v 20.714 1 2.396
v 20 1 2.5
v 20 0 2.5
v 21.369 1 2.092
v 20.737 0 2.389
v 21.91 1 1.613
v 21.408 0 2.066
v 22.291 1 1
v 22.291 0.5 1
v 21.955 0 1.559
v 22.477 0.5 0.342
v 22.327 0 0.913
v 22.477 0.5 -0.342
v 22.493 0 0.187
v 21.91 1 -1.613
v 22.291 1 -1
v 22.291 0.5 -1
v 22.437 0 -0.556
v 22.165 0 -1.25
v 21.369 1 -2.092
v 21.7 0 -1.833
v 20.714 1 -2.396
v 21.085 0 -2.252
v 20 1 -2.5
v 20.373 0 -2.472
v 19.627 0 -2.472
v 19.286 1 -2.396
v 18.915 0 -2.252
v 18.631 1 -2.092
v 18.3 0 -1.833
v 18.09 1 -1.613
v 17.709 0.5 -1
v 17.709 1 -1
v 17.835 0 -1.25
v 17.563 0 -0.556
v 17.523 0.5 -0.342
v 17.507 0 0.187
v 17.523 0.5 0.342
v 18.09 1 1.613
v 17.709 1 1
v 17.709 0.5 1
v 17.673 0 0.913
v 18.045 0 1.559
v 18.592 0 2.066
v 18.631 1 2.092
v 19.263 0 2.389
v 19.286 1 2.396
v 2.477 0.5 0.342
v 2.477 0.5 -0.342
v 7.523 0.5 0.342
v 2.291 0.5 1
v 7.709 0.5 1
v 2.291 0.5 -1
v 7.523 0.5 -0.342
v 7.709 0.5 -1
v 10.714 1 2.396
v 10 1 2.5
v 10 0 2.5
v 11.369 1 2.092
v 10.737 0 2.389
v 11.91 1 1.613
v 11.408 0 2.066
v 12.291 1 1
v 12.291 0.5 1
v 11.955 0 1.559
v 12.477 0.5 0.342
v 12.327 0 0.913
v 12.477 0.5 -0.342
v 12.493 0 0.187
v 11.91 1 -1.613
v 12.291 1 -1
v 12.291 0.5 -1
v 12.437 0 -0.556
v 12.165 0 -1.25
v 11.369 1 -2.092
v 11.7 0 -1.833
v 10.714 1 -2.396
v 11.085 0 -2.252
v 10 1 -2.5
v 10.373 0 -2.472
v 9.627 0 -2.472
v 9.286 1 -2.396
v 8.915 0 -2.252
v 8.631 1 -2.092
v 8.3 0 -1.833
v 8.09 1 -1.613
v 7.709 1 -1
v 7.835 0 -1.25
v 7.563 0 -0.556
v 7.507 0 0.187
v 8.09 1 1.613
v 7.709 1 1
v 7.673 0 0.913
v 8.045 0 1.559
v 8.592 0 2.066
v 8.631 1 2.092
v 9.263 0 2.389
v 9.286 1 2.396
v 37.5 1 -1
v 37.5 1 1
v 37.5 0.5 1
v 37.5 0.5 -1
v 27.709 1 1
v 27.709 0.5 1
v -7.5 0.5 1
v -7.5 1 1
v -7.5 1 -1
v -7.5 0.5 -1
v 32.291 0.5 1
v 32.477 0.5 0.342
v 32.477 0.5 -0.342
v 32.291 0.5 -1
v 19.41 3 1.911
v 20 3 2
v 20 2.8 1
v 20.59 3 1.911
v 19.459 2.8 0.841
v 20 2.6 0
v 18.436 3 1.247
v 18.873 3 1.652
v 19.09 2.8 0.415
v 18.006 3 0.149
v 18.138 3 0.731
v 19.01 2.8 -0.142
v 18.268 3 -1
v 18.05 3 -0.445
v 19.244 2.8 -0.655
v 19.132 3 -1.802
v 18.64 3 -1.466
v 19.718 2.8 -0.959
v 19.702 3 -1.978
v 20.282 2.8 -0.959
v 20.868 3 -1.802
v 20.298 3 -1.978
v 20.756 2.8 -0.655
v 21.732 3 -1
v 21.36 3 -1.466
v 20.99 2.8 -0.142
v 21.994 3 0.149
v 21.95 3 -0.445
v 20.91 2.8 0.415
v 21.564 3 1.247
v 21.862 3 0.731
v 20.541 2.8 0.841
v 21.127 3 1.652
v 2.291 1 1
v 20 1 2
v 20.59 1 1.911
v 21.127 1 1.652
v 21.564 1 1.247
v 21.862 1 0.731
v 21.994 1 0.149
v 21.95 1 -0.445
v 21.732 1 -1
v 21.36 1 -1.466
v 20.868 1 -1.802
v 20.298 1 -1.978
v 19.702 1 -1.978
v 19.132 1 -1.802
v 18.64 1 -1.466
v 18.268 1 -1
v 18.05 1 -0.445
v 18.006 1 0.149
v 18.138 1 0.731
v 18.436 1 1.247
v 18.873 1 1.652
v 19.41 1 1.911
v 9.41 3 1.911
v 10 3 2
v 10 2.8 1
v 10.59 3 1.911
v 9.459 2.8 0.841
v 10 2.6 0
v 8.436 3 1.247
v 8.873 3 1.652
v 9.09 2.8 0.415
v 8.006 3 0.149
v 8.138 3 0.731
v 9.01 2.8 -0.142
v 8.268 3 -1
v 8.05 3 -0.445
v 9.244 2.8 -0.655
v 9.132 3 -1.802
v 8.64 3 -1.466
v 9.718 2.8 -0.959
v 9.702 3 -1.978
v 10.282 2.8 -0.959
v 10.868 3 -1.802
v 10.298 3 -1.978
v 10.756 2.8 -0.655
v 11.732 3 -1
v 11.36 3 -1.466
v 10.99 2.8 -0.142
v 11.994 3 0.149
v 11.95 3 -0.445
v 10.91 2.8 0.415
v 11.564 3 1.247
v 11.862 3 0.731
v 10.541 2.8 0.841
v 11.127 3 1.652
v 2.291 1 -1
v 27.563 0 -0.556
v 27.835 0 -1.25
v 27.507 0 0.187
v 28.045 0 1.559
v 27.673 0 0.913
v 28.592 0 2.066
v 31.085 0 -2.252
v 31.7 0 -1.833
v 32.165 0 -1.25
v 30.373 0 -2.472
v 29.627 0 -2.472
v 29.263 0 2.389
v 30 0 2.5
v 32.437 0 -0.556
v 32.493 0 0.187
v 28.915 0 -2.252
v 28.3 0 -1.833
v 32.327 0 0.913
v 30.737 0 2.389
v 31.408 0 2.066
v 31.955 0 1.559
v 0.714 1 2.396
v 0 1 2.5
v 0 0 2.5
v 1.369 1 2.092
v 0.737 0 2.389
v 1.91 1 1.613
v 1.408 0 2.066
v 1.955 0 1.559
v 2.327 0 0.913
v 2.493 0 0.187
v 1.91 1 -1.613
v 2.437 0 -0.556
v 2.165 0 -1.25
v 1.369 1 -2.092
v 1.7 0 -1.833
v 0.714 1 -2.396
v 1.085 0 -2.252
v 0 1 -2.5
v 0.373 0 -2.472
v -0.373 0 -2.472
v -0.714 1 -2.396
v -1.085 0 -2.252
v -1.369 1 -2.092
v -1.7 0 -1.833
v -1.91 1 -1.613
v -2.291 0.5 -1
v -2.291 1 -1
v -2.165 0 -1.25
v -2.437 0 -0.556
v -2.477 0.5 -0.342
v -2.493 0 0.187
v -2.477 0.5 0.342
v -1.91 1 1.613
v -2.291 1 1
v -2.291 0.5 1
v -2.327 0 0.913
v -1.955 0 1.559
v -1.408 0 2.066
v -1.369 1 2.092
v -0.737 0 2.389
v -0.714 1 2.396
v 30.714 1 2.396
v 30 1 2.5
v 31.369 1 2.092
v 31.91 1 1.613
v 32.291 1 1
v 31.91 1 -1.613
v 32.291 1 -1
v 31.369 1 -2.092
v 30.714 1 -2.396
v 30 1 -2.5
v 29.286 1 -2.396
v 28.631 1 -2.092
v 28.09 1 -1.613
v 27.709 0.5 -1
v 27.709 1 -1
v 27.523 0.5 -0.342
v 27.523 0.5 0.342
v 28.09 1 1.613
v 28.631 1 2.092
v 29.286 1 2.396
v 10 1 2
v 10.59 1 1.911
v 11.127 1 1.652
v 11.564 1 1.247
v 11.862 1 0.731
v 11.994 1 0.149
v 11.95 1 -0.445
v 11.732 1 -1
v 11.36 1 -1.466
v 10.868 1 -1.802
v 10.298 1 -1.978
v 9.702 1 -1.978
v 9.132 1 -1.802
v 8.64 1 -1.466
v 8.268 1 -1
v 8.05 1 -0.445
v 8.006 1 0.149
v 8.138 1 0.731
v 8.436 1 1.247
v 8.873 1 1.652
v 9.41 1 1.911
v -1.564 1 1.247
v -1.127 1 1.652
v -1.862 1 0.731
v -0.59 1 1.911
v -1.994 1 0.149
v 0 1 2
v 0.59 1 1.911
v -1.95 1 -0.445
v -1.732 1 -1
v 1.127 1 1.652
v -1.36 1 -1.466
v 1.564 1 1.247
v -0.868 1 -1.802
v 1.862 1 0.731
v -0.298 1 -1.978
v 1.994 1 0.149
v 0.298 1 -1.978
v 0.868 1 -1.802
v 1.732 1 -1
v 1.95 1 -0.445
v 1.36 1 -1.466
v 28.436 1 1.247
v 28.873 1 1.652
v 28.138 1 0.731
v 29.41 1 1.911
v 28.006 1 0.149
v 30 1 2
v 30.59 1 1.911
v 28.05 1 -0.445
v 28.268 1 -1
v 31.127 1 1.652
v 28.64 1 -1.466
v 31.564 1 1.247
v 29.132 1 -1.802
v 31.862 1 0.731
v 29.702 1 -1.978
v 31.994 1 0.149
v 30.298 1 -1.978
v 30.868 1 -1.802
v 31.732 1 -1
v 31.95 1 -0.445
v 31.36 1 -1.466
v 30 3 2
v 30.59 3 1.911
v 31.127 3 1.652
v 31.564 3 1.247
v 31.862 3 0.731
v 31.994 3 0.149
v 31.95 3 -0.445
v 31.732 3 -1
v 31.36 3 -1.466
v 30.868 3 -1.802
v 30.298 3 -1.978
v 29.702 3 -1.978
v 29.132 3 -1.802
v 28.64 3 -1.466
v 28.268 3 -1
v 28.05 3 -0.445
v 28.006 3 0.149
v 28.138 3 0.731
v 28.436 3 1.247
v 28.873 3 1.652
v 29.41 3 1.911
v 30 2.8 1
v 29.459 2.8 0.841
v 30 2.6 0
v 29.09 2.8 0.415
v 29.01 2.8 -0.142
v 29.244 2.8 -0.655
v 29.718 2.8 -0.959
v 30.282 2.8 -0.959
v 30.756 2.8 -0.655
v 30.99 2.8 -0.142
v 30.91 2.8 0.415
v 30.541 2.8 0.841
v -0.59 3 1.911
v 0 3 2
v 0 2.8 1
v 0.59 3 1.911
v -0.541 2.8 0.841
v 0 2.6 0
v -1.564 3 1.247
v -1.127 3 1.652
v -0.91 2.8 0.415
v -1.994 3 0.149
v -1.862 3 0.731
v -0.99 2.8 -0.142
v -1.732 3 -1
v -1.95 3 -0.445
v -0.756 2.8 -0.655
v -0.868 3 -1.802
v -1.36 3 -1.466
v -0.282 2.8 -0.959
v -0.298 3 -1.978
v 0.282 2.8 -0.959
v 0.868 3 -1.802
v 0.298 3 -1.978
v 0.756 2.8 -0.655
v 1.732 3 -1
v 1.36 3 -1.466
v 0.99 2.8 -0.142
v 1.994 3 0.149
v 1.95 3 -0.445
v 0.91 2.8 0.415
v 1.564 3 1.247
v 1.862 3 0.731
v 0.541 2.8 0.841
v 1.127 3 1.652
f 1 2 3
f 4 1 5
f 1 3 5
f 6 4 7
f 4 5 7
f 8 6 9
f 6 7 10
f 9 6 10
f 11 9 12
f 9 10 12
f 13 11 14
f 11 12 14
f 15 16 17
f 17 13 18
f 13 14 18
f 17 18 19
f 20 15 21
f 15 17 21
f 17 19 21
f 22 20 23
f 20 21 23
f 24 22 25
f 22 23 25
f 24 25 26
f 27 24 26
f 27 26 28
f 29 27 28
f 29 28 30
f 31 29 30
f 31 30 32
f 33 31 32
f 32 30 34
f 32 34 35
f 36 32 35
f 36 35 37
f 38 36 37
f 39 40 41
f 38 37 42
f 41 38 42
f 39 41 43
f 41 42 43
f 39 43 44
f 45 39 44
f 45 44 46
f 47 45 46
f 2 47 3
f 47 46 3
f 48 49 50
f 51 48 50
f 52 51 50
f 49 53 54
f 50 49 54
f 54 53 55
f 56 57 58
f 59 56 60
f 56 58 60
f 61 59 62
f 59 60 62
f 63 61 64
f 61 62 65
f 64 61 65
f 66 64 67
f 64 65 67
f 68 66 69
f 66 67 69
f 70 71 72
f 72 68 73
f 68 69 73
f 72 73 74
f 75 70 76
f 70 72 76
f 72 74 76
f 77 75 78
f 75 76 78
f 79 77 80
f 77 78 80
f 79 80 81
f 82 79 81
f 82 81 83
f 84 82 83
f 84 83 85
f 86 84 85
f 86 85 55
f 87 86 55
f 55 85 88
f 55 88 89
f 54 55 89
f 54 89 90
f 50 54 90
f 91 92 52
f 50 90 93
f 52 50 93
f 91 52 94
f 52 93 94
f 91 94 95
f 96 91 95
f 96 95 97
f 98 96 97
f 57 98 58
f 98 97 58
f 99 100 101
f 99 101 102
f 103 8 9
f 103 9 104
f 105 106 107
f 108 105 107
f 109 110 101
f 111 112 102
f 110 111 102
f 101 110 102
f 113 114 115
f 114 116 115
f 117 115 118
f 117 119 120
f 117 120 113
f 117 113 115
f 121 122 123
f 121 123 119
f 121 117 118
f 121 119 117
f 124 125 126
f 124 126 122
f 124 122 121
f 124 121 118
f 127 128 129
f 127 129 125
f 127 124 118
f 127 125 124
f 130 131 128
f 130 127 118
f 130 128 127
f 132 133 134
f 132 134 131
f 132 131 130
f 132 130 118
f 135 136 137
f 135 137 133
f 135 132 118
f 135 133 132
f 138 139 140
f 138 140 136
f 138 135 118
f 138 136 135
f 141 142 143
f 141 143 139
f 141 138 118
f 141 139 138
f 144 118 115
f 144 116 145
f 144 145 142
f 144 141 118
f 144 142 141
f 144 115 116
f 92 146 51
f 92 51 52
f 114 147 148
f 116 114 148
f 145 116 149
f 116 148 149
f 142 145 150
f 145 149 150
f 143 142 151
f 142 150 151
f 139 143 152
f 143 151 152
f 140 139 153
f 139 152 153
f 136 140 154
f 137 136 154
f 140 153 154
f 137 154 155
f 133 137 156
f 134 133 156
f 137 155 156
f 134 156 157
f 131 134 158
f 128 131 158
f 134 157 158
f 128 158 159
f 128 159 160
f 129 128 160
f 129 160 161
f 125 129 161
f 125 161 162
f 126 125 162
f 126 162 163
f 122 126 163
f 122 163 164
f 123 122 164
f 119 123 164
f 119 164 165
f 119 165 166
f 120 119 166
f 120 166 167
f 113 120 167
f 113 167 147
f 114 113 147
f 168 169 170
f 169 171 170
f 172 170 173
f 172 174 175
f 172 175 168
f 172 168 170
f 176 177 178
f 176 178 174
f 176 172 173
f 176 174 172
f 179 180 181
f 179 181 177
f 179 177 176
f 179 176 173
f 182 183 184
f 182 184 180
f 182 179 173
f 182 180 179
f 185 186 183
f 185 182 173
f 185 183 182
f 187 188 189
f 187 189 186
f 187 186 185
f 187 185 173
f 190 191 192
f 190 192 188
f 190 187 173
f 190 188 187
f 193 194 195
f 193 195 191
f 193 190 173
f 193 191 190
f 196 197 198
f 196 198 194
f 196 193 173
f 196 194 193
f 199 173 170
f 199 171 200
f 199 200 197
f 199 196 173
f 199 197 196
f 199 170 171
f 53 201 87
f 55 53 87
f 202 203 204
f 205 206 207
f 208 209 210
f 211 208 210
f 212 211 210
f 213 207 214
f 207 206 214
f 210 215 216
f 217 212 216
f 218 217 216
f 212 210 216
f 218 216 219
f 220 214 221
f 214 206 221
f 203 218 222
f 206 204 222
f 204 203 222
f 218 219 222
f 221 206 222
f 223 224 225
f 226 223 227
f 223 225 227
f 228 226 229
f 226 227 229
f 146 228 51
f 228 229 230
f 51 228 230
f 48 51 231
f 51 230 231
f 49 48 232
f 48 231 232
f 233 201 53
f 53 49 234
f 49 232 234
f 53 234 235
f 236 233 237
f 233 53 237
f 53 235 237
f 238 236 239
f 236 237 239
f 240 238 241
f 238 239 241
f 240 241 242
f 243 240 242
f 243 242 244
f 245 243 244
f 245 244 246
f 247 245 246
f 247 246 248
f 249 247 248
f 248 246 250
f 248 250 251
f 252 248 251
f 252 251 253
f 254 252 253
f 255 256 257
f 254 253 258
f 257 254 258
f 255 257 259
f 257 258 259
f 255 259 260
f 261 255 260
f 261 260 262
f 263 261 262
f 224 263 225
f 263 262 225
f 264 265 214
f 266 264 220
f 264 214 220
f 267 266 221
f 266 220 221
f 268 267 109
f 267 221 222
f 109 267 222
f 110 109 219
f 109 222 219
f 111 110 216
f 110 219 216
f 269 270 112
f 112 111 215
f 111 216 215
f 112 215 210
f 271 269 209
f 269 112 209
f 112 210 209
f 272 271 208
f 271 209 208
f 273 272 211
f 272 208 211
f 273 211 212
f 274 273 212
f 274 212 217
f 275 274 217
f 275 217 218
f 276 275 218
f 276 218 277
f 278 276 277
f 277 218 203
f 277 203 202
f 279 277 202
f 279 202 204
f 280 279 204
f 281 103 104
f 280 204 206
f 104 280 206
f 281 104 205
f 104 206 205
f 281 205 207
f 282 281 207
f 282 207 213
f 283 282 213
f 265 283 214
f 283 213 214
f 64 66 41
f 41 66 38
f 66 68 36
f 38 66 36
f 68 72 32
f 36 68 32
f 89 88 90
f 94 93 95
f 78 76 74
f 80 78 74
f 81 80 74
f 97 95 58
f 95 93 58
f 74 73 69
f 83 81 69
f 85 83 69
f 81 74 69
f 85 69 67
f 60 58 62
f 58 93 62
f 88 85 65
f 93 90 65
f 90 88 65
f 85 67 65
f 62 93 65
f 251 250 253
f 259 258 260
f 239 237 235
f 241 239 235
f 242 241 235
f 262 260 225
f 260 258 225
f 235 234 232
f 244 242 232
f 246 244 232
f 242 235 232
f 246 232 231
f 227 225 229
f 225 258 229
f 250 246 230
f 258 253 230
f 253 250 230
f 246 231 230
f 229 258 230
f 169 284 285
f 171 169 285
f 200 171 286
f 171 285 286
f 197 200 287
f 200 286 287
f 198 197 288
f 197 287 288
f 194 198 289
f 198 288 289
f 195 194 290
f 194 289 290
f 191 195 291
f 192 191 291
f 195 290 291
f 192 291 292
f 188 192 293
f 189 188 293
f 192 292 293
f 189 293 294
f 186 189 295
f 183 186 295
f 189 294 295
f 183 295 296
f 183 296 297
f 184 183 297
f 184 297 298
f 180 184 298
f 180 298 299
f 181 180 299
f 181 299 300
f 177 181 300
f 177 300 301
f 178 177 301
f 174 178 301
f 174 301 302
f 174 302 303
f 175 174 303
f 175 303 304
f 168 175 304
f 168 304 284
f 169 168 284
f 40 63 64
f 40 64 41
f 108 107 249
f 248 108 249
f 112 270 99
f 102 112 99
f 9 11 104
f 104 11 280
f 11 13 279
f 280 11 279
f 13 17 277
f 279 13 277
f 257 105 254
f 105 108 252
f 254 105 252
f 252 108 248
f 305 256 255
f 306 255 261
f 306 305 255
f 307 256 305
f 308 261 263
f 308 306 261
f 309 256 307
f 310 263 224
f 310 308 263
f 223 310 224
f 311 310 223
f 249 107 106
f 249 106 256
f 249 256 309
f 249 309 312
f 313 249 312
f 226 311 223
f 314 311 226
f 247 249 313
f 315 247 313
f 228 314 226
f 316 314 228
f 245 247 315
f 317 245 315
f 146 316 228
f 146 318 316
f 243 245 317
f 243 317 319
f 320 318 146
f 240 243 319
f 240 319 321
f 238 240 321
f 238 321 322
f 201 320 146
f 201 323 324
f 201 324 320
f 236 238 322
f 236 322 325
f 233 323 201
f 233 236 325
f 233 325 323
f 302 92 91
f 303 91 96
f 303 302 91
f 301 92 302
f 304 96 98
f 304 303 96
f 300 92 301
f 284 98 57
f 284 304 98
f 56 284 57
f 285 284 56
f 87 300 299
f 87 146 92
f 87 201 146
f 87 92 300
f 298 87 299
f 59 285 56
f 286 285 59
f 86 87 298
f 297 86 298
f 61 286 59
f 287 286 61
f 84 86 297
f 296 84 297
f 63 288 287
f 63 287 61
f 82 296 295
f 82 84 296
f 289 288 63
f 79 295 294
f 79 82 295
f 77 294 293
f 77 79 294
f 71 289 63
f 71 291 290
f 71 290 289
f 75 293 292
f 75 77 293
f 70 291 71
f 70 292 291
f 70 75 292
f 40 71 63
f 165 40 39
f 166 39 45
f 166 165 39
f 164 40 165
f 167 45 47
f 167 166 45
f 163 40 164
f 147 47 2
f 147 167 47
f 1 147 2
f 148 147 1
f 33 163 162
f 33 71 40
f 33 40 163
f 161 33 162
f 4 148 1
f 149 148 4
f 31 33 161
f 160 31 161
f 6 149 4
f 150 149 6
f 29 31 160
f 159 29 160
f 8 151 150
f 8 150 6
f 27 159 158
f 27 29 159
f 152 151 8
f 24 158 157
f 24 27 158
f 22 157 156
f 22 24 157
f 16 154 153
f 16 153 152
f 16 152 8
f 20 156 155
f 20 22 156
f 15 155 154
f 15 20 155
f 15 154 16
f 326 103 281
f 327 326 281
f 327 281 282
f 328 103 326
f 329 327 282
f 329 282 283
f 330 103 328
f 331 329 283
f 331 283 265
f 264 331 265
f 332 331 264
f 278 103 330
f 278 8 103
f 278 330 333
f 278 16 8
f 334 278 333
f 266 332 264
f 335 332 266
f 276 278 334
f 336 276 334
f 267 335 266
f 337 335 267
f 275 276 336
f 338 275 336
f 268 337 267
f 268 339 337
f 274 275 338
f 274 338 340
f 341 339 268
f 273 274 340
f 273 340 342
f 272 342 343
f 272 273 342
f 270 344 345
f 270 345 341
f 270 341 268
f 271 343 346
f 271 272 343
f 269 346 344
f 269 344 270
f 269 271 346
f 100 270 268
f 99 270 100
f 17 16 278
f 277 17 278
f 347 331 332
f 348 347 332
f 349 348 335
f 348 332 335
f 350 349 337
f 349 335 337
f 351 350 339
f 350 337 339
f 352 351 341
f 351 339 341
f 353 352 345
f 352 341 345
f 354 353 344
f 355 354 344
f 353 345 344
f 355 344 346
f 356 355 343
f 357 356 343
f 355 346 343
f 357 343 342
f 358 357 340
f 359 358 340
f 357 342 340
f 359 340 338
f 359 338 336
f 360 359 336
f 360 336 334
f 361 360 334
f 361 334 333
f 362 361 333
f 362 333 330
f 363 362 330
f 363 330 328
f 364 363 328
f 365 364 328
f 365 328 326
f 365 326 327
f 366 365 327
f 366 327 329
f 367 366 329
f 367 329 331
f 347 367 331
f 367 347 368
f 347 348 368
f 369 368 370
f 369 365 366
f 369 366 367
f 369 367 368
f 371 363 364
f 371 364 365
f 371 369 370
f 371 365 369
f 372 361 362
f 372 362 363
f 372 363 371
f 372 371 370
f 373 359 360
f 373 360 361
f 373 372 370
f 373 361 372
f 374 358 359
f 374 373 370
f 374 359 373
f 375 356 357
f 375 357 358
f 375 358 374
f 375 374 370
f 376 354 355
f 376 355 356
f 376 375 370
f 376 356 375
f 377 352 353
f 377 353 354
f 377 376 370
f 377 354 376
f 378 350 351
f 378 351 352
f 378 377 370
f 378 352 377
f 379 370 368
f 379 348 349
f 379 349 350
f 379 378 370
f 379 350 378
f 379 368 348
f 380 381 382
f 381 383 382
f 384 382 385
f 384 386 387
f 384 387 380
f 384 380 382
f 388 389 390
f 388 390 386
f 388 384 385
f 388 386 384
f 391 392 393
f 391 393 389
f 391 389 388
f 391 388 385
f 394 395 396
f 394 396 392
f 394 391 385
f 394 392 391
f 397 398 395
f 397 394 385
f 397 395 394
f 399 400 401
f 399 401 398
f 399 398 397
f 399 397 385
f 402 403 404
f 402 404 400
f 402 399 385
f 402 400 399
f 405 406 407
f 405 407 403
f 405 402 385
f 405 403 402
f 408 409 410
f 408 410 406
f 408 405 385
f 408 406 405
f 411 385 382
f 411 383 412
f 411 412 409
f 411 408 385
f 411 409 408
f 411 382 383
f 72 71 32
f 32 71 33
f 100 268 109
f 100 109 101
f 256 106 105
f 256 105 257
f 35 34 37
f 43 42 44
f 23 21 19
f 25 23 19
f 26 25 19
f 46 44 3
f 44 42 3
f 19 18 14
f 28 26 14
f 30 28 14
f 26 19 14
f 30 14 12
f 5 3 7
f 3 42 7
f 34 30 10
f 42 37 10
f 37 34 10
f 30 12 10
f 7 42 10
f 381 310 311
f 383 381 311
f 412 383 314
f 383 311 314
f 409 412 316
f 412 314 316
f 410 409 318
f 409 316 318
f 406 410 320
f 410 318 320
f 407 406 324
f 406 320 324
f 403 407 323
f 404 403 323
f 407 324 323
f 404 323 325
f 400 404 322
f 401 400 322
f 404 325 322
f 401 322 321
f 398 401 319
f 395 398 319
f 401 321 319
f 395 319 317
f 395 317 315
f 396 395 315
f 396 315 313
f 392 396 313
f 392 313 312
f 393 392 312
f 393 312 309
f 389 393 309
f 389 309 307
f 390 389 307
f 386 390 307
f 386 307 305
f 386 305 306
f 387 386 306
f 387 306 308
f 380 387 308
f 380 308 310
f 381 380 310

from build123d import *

# Parameters (mm, degrees)
SKETCH1_R           = 2
BOSS_EXTRUDE1_DEPTH = 3
SKETCH3_R           = 2.5
BOSS_EXTRUDE3_DEPTH = 1
LPATTERN4_COUNT     = 4
LPATTERN4_PITCH     = 10
SKETCH4_W           = 45
SKETCH4_H           = 2
BOSS_EXTRUDE4_DEPTH = 0.5


with BuildPart() as part:
    # Sketch1 → Boss-Extrude1 (new body)
    with BuildSketch(Plane(origin=(0, 0, 0), x_dir=(1, 0, 0), z_dir=(0, 1, 0))):
        with Locations(Location((0, 0, 0), (0, 0, 270))):
            Circle(SKETCH1_R)
    extrude(amount=BOSS_EXTRUDE1_DEPTH)

    # Sketch2 → Cut-Revolve1 (revolve, cut)
    with BuildSketch(Plane(origin=(0, 0, 0), x_dir=(0, 0, -1), z_dir=(1, 0, 0))):
        Polygon((0, 3), (0, 2.6), (-2, 3), align=None)
    revolve(axis=Axis((0, 3, 0), (0, -1, 0)), mode=Mode.SUBTRACT)

    # Sketch3 → Boss-Extrude3 (add)
    with BuildSketch(Plane(origin=(0, 0, 0), x_dir=(1, 0, 0), z_dir=(0, 1, 0))):
        with Locations(Location((0, 0, 0), (0, 0, 270))):
            Circle(SKETCH3_R)
    extrude(amount=BOSS_EXTRUDE3_DEPTH)


with BuildPart() as lpattern4_1:
    # LPattern4: pattern copy
    add(part.part.moved(Location(Vector(1, 0, 0) * (1 * LPATTERN4_PITCH))))


with BuildPart() as lpattern4_2:
    # LPattern4: pattern copy
    add(part.part.moved(Location(Vector(1, 0, 0) * (2 * LPATTERN4_PITCH))))


with BuildPart() as lpattern4_3:
    # LPattern4: pattern copy
    add(part.part.moved(Location(Vector(1, 0, 0) * (3 * LPATTERN4_PITCH))))


with BuildPart() as part_1:
    add(part.part)

    add(lpattern4_1.part)  # Boss-Extrude4 merges LPattern4_1

    add(lpattern4_2.part)  # Boss-Extrude4 merges LPattern4_2

    add(lpattern4_3.part)  # Boss-Extrude4 merges LPattern4_3
    # Sketch4 → Boss-Extrude4 (add)
    with BuildSketch(Plane(origin=(0, 1, 0), x_dir=(1, 0, 0), z_dir=(0, 1, 0))):
        with Locations((15, 0)):
            Rectangle(SKETCH4_W, SKETCH4_H)
    extrude(amount=-BOSS_EXTRUDE4_DEPTH)


solid = part_1.part
